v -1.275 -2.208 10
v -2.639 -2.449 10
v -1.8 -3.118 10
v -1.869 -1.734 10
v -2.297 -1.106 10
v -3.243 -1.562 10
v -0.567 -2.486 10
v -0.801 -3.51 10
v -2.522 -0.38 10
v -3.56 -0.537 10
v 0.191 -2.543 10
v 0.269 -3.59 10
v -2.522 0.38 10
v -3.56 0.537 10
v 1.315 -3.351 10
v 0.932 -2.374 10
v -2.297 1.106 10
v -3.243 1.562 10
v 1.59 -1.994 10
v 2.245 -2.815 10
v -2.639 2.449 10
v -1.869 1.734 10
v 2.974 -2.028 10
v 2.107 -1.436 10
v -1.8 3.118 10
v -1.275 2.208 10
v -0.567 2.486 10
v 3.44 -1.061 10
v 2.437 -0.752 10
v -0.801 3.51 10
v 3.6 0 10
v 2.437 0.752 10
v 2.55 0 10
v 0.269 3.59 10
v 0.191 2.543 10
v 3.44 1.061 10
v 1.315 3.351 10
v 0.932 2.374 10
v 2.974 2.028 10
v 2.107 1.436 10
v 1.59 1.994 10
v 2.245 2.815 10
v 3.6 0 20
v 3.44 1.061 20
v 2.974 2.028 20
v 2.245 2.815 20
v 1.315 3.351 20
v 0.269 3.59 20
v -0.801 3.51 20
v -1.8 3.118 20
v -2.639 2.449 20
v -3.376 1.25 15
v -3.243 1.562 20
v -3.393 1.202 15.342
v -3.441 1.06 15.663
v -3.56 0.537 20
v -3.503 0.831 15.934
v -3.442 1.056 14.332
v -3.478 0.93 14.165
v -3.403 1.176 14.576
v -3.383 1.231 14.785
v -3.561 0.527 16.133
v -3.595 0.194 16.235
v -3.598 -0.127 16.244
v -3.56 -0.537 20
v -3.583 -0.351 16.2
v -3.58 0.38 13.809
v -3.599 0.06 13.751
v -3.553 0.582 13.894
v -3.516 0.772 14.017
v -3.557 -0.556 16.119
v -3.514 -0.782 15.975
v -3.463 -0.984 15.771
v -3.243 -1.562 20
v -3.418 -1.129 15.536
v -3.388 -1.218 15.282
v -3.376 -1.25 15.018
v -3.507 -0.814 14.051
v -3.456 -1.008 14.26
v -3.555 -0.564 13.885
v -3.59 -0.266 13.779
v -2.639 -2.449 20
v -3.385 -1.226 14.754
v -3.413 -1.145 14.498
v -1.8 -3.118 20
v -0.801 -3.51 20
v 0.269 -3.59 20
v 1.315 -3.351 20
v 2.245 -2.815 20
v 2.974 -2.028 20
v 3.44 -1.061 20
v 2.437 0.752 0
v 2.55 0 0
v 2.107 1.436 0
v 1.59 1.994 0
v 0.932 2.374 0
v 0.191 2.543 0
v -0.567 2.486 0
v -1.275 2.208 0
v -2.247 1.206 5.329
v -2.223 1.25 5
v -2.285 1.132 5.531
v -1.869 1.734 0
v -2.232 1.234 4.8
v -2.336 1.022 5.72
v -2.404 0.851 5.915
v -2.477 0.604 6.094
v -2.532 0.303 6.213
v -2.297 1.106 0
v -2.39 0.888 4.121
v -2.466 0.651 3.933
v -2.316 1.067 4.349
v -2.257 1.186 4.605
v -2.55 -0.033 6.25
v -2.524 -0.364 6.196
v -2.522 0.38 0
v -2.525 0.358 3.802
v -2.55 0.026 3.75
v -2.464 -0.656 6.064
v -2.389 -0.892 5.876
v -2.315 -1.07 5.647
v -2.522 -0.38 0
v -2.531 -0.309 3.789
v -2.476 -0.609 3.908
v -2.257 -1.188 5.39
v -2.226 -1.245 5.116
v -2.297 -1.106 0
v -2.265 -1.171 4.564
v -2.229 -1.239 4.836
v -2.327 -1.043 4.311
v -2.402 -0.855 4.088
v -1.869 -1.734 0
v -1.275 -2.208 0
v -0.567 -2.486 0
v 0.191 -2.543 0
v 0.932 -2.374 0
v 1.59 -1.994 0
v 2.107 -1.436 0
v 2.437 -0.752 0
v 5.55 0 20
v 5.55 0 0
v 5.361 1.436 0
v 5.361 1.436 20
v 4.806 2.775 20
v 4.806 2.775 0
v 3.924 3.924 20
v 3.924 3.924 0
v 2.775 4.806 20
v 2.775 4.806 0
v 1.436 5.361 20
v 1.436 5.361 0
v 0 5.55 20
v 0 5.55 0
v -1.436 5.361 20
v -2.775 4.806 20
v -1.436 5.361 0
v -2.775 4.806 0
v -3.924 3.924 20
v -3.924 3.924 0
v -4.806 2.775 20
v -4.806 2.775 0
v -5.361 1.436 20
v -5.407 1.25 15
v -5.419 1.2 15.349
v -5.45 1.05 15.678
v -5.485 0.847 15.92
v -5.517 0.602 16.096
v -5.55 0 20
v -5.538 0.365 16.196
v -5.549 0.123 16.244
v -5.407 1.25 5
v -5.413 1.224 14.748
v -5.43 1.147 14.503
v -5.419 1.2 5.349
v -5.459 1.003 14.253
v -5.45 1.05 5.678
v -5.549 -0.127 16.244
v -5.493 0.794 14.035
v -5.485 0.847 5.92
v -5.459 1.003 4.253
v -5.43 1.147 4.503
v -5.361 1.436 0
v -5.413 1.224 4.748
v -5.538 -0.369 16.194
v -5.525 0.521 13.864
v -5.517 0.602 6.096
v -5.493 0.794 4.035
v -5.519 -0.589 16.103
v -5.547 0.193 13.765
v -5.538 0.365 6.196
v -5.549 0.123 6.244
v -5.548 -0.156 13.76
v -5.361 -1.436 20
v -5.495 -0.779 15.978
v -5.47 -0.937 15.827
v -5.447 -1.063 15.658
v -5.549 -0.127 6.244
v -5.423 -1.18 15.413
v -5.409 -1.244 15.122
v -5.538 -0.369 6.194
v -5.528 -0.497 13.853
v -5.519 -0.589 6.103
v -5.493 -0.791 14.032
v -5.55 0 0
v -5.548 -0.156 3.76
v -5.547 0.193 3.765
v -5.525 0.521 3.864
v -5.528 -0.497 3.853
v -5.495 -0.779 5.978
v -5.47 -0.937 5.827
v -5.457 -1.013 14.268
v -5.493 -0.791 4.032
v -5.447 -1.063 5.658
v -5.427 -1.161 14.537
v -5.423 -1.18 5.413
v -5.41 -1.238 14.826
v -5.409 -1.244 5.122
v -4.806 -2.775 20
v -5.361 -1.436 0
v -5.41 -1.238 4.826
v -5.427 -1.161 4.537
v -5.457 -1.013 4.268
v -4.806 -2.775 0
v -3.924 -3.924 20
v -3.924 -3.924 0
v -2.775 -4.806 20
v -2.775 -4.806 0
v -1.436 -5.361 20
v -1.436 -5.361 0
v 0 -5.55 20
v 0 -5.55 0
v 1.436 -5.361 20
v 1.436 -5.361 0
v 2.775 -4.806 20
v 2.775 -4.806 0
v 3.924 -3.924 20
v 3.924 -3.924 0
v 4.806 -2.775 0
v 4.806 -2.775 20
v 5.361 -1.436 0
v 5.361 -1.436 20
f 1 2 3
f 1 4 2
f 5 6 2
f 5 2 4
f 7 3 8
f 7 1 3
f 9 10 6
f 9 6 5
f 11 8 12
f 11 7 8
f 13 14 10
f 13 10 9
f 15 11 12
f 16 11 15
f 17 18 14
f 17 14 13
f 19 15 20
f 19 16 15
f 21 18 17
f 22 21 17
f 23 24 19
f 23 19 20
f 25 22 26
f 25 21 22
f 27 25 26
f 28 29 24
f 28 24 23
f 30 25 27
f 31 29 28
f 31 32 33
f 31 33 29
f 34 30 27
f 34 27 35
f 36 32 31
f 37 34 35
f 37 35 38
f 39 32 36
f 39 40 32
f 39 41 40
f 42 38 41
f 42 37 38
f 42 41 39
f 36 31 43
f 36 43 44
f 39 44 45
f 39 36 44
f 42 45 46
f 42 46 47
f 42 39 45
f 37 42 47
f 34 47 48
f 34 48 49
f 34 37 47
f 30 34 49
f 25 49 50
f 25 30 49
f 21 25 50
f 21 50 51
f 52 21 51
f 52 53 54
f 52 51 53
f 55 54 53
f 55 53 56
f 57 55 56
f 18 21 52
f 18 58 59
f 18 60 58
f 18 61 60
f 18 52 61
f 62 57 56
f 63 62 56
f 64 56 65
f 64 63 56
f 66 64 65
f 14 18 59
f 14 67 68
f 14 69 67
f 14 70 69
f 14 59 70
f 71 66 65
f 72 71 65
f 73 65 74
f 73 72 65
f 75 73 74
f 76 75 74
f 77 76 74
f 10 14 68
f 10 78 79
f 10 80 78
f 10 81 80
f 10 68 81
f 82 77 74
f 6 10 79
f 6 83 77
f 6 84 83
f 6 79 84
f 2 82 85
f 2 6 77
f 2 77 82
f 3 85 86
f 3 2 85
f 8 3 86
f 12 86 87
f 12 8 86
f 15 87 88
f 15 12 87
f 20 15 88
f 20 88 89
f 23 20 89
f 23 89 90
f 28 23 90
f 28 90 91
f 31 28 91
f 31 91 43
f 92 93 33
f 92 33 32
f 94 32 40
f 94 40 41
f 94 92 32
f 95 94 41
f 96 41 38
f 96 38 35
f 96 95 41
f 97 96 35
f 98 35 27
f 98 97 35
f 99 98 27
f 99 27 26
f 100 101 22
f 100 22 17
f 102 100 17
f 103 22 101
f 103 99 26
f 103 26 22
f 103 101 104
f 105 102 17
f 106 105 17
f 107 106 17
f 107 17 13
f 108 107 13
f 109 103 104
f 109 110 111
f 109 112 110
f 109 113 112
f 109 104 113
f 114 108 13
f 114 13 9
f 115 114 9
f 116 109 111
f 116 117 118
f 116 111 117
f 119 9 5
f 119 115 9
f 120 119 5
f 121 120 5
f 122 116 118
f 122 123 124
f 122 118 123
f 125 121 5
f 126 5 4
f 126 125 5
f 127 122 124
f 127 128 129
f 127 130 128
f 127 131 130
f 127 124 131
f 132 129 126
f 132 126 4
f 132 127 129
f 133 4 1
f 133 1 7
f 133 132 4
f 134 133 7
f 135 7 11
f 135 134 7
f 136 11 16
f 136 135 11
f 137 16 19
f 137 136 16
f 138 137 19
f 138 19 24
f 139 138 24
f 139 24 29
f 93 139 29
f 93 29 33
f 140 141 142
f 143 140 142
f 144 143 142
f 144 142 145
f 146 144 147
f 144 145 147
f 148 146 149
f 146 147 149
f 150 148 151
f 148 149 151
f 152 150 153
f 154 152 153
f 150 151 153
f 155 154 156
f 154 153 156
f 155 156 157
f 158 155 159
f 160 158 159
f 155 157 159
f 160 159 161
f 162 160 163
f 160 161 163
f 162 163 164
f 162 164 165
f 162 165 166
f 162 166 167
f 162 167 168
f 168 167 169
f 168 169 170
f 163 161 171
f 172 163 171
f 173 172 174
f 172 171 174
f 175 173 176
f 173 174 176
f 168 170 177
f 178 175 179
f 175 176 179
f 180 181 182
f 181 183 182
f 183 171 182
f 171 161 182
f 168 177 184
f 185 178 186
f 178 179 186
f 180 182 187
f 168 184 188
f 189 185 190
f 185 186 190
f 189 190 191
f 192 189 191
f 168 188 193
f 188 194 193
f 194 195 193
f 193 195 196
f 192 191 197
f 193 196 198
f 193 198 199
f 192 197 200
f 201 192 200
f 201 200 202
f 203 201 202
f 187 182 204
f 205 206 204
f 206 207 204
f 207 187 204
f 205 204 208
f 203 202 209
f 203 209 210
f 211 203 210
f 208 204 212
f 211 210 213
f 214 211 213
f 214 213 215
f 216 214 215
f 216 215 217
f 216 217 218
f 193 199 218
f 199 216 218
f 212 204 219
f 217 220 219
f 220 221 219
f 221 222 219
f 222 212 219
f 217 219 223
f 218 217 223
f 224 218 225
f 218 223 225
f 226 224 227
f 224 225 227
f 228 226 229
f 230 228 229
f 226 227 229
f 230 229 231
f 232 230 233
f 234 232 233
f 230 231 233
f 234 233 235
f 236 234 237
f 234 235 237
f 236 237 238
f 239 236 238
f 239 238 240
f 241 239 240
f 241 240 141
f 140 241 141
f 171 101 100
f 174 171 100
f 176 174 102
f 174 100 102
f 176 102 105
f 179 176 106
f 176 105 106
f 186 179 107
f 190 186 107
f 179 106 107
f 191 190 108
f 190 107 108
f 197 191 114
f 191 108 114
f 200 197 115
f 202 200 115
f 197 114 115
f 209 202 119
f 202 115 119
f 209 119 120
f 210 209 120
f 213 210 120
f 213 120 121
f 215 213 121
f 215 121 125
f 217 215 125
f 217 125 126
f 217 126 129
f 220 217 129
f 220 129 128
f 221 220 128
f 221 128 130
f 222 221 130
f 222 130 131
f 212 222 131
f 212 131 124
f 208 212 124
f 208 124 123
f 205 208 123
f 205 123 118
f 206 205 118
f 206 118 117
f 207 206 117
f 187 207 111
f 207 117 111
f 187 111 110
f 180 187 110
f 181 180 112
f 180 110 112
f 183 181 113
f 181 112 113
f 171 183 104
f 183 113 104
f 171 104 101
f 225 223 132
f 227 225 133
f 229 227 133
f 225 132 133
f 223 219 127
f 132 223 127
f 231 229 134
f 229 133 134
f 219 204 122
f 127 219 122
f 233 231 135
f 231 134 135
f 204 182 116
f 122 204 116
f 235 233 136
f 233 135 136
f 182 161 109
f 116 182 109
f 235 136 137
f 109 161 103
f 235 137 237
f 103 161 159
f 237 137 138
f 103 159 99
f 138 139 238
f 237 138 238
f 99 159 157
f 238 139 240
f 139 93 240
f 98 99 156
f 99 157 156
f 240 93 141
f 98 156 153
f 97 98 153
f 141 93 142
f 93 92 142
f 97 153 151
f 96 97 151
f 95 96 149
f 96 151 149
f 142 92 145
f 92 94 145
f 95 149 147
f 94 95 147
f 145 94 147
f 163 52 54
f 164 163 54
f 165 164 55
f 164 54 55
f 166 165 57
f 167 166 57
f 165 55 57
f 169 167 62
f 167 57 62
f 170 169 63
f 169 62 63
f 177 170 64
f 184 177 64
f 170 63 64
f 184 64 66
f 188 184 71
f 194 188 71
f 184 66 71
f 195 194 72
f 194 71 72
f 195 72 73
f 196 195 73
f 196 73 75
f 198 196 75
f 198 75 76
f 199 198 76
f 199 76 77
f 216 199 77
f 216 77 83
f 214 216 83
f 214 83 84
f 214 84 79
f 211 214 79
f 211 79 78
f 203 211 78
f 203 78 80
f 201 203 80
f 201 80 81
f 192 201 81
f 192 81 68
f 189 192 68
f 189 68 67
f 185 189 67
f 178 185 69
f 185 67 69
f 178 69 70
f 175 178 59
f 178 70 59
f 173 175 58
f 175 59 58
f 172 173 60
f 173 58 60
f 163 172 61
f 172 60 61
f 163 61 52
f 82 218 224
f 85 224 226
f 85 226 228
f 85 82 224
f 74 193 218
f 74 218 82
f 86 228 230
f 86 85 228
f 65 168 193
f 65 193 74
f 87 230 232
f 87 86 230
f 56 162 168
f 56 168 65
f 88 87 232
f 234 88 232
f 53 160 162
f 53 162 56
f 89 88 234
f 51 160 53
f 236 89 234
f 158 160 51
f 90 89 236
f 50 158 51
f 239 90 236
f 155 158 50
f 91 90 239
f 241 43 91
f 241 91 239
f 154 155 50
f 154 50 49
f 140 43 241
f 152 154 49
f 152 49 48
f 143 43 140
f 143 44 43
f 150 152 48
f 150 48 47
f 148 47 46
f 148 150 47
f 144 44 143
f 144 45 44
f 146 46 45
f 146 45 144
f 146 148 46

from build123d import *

# Parameters (mm, degrees)
F0_R     = 5.55
F0_R_2   = 2.55
F1_DEPTH = 10
F2_R     = 5.55
F2_R_2   = 3.6
F3_DEPTH = 10
F4_R     = 1.25
F5_DEPTH = 5.551


with BuildPart() as f1:
    # F0 (on Top) → F1 (new body)
    with BuildSketch(Plane.XY):
        Circle(F0_R)
        Circle(F0_R_2, mode=Mode.SUBTRACT)
    extrude(amount=F1_DEPTH)

    # F2 (on face) → F3 (join)
    with BuildSketch(Plane.XY.offset(10)):
        Circle(F2_R)
        Circle(F2_R_2, mode=Mode.SUBTRACT)
    extrude(amount=F3_DEPTH)

    # F4 (on Right) → F5 (cut, through all)
    with BuildSketch(Plane.YZ):
        with Locations((0, 15)):
            Circle(F4_R)
        with Locations((0, 5)):
            Circle(F4_R)
    extrude(amount=-F5_DEPTH, mode=Mode.SUBTRACT)


solid = f1.part
